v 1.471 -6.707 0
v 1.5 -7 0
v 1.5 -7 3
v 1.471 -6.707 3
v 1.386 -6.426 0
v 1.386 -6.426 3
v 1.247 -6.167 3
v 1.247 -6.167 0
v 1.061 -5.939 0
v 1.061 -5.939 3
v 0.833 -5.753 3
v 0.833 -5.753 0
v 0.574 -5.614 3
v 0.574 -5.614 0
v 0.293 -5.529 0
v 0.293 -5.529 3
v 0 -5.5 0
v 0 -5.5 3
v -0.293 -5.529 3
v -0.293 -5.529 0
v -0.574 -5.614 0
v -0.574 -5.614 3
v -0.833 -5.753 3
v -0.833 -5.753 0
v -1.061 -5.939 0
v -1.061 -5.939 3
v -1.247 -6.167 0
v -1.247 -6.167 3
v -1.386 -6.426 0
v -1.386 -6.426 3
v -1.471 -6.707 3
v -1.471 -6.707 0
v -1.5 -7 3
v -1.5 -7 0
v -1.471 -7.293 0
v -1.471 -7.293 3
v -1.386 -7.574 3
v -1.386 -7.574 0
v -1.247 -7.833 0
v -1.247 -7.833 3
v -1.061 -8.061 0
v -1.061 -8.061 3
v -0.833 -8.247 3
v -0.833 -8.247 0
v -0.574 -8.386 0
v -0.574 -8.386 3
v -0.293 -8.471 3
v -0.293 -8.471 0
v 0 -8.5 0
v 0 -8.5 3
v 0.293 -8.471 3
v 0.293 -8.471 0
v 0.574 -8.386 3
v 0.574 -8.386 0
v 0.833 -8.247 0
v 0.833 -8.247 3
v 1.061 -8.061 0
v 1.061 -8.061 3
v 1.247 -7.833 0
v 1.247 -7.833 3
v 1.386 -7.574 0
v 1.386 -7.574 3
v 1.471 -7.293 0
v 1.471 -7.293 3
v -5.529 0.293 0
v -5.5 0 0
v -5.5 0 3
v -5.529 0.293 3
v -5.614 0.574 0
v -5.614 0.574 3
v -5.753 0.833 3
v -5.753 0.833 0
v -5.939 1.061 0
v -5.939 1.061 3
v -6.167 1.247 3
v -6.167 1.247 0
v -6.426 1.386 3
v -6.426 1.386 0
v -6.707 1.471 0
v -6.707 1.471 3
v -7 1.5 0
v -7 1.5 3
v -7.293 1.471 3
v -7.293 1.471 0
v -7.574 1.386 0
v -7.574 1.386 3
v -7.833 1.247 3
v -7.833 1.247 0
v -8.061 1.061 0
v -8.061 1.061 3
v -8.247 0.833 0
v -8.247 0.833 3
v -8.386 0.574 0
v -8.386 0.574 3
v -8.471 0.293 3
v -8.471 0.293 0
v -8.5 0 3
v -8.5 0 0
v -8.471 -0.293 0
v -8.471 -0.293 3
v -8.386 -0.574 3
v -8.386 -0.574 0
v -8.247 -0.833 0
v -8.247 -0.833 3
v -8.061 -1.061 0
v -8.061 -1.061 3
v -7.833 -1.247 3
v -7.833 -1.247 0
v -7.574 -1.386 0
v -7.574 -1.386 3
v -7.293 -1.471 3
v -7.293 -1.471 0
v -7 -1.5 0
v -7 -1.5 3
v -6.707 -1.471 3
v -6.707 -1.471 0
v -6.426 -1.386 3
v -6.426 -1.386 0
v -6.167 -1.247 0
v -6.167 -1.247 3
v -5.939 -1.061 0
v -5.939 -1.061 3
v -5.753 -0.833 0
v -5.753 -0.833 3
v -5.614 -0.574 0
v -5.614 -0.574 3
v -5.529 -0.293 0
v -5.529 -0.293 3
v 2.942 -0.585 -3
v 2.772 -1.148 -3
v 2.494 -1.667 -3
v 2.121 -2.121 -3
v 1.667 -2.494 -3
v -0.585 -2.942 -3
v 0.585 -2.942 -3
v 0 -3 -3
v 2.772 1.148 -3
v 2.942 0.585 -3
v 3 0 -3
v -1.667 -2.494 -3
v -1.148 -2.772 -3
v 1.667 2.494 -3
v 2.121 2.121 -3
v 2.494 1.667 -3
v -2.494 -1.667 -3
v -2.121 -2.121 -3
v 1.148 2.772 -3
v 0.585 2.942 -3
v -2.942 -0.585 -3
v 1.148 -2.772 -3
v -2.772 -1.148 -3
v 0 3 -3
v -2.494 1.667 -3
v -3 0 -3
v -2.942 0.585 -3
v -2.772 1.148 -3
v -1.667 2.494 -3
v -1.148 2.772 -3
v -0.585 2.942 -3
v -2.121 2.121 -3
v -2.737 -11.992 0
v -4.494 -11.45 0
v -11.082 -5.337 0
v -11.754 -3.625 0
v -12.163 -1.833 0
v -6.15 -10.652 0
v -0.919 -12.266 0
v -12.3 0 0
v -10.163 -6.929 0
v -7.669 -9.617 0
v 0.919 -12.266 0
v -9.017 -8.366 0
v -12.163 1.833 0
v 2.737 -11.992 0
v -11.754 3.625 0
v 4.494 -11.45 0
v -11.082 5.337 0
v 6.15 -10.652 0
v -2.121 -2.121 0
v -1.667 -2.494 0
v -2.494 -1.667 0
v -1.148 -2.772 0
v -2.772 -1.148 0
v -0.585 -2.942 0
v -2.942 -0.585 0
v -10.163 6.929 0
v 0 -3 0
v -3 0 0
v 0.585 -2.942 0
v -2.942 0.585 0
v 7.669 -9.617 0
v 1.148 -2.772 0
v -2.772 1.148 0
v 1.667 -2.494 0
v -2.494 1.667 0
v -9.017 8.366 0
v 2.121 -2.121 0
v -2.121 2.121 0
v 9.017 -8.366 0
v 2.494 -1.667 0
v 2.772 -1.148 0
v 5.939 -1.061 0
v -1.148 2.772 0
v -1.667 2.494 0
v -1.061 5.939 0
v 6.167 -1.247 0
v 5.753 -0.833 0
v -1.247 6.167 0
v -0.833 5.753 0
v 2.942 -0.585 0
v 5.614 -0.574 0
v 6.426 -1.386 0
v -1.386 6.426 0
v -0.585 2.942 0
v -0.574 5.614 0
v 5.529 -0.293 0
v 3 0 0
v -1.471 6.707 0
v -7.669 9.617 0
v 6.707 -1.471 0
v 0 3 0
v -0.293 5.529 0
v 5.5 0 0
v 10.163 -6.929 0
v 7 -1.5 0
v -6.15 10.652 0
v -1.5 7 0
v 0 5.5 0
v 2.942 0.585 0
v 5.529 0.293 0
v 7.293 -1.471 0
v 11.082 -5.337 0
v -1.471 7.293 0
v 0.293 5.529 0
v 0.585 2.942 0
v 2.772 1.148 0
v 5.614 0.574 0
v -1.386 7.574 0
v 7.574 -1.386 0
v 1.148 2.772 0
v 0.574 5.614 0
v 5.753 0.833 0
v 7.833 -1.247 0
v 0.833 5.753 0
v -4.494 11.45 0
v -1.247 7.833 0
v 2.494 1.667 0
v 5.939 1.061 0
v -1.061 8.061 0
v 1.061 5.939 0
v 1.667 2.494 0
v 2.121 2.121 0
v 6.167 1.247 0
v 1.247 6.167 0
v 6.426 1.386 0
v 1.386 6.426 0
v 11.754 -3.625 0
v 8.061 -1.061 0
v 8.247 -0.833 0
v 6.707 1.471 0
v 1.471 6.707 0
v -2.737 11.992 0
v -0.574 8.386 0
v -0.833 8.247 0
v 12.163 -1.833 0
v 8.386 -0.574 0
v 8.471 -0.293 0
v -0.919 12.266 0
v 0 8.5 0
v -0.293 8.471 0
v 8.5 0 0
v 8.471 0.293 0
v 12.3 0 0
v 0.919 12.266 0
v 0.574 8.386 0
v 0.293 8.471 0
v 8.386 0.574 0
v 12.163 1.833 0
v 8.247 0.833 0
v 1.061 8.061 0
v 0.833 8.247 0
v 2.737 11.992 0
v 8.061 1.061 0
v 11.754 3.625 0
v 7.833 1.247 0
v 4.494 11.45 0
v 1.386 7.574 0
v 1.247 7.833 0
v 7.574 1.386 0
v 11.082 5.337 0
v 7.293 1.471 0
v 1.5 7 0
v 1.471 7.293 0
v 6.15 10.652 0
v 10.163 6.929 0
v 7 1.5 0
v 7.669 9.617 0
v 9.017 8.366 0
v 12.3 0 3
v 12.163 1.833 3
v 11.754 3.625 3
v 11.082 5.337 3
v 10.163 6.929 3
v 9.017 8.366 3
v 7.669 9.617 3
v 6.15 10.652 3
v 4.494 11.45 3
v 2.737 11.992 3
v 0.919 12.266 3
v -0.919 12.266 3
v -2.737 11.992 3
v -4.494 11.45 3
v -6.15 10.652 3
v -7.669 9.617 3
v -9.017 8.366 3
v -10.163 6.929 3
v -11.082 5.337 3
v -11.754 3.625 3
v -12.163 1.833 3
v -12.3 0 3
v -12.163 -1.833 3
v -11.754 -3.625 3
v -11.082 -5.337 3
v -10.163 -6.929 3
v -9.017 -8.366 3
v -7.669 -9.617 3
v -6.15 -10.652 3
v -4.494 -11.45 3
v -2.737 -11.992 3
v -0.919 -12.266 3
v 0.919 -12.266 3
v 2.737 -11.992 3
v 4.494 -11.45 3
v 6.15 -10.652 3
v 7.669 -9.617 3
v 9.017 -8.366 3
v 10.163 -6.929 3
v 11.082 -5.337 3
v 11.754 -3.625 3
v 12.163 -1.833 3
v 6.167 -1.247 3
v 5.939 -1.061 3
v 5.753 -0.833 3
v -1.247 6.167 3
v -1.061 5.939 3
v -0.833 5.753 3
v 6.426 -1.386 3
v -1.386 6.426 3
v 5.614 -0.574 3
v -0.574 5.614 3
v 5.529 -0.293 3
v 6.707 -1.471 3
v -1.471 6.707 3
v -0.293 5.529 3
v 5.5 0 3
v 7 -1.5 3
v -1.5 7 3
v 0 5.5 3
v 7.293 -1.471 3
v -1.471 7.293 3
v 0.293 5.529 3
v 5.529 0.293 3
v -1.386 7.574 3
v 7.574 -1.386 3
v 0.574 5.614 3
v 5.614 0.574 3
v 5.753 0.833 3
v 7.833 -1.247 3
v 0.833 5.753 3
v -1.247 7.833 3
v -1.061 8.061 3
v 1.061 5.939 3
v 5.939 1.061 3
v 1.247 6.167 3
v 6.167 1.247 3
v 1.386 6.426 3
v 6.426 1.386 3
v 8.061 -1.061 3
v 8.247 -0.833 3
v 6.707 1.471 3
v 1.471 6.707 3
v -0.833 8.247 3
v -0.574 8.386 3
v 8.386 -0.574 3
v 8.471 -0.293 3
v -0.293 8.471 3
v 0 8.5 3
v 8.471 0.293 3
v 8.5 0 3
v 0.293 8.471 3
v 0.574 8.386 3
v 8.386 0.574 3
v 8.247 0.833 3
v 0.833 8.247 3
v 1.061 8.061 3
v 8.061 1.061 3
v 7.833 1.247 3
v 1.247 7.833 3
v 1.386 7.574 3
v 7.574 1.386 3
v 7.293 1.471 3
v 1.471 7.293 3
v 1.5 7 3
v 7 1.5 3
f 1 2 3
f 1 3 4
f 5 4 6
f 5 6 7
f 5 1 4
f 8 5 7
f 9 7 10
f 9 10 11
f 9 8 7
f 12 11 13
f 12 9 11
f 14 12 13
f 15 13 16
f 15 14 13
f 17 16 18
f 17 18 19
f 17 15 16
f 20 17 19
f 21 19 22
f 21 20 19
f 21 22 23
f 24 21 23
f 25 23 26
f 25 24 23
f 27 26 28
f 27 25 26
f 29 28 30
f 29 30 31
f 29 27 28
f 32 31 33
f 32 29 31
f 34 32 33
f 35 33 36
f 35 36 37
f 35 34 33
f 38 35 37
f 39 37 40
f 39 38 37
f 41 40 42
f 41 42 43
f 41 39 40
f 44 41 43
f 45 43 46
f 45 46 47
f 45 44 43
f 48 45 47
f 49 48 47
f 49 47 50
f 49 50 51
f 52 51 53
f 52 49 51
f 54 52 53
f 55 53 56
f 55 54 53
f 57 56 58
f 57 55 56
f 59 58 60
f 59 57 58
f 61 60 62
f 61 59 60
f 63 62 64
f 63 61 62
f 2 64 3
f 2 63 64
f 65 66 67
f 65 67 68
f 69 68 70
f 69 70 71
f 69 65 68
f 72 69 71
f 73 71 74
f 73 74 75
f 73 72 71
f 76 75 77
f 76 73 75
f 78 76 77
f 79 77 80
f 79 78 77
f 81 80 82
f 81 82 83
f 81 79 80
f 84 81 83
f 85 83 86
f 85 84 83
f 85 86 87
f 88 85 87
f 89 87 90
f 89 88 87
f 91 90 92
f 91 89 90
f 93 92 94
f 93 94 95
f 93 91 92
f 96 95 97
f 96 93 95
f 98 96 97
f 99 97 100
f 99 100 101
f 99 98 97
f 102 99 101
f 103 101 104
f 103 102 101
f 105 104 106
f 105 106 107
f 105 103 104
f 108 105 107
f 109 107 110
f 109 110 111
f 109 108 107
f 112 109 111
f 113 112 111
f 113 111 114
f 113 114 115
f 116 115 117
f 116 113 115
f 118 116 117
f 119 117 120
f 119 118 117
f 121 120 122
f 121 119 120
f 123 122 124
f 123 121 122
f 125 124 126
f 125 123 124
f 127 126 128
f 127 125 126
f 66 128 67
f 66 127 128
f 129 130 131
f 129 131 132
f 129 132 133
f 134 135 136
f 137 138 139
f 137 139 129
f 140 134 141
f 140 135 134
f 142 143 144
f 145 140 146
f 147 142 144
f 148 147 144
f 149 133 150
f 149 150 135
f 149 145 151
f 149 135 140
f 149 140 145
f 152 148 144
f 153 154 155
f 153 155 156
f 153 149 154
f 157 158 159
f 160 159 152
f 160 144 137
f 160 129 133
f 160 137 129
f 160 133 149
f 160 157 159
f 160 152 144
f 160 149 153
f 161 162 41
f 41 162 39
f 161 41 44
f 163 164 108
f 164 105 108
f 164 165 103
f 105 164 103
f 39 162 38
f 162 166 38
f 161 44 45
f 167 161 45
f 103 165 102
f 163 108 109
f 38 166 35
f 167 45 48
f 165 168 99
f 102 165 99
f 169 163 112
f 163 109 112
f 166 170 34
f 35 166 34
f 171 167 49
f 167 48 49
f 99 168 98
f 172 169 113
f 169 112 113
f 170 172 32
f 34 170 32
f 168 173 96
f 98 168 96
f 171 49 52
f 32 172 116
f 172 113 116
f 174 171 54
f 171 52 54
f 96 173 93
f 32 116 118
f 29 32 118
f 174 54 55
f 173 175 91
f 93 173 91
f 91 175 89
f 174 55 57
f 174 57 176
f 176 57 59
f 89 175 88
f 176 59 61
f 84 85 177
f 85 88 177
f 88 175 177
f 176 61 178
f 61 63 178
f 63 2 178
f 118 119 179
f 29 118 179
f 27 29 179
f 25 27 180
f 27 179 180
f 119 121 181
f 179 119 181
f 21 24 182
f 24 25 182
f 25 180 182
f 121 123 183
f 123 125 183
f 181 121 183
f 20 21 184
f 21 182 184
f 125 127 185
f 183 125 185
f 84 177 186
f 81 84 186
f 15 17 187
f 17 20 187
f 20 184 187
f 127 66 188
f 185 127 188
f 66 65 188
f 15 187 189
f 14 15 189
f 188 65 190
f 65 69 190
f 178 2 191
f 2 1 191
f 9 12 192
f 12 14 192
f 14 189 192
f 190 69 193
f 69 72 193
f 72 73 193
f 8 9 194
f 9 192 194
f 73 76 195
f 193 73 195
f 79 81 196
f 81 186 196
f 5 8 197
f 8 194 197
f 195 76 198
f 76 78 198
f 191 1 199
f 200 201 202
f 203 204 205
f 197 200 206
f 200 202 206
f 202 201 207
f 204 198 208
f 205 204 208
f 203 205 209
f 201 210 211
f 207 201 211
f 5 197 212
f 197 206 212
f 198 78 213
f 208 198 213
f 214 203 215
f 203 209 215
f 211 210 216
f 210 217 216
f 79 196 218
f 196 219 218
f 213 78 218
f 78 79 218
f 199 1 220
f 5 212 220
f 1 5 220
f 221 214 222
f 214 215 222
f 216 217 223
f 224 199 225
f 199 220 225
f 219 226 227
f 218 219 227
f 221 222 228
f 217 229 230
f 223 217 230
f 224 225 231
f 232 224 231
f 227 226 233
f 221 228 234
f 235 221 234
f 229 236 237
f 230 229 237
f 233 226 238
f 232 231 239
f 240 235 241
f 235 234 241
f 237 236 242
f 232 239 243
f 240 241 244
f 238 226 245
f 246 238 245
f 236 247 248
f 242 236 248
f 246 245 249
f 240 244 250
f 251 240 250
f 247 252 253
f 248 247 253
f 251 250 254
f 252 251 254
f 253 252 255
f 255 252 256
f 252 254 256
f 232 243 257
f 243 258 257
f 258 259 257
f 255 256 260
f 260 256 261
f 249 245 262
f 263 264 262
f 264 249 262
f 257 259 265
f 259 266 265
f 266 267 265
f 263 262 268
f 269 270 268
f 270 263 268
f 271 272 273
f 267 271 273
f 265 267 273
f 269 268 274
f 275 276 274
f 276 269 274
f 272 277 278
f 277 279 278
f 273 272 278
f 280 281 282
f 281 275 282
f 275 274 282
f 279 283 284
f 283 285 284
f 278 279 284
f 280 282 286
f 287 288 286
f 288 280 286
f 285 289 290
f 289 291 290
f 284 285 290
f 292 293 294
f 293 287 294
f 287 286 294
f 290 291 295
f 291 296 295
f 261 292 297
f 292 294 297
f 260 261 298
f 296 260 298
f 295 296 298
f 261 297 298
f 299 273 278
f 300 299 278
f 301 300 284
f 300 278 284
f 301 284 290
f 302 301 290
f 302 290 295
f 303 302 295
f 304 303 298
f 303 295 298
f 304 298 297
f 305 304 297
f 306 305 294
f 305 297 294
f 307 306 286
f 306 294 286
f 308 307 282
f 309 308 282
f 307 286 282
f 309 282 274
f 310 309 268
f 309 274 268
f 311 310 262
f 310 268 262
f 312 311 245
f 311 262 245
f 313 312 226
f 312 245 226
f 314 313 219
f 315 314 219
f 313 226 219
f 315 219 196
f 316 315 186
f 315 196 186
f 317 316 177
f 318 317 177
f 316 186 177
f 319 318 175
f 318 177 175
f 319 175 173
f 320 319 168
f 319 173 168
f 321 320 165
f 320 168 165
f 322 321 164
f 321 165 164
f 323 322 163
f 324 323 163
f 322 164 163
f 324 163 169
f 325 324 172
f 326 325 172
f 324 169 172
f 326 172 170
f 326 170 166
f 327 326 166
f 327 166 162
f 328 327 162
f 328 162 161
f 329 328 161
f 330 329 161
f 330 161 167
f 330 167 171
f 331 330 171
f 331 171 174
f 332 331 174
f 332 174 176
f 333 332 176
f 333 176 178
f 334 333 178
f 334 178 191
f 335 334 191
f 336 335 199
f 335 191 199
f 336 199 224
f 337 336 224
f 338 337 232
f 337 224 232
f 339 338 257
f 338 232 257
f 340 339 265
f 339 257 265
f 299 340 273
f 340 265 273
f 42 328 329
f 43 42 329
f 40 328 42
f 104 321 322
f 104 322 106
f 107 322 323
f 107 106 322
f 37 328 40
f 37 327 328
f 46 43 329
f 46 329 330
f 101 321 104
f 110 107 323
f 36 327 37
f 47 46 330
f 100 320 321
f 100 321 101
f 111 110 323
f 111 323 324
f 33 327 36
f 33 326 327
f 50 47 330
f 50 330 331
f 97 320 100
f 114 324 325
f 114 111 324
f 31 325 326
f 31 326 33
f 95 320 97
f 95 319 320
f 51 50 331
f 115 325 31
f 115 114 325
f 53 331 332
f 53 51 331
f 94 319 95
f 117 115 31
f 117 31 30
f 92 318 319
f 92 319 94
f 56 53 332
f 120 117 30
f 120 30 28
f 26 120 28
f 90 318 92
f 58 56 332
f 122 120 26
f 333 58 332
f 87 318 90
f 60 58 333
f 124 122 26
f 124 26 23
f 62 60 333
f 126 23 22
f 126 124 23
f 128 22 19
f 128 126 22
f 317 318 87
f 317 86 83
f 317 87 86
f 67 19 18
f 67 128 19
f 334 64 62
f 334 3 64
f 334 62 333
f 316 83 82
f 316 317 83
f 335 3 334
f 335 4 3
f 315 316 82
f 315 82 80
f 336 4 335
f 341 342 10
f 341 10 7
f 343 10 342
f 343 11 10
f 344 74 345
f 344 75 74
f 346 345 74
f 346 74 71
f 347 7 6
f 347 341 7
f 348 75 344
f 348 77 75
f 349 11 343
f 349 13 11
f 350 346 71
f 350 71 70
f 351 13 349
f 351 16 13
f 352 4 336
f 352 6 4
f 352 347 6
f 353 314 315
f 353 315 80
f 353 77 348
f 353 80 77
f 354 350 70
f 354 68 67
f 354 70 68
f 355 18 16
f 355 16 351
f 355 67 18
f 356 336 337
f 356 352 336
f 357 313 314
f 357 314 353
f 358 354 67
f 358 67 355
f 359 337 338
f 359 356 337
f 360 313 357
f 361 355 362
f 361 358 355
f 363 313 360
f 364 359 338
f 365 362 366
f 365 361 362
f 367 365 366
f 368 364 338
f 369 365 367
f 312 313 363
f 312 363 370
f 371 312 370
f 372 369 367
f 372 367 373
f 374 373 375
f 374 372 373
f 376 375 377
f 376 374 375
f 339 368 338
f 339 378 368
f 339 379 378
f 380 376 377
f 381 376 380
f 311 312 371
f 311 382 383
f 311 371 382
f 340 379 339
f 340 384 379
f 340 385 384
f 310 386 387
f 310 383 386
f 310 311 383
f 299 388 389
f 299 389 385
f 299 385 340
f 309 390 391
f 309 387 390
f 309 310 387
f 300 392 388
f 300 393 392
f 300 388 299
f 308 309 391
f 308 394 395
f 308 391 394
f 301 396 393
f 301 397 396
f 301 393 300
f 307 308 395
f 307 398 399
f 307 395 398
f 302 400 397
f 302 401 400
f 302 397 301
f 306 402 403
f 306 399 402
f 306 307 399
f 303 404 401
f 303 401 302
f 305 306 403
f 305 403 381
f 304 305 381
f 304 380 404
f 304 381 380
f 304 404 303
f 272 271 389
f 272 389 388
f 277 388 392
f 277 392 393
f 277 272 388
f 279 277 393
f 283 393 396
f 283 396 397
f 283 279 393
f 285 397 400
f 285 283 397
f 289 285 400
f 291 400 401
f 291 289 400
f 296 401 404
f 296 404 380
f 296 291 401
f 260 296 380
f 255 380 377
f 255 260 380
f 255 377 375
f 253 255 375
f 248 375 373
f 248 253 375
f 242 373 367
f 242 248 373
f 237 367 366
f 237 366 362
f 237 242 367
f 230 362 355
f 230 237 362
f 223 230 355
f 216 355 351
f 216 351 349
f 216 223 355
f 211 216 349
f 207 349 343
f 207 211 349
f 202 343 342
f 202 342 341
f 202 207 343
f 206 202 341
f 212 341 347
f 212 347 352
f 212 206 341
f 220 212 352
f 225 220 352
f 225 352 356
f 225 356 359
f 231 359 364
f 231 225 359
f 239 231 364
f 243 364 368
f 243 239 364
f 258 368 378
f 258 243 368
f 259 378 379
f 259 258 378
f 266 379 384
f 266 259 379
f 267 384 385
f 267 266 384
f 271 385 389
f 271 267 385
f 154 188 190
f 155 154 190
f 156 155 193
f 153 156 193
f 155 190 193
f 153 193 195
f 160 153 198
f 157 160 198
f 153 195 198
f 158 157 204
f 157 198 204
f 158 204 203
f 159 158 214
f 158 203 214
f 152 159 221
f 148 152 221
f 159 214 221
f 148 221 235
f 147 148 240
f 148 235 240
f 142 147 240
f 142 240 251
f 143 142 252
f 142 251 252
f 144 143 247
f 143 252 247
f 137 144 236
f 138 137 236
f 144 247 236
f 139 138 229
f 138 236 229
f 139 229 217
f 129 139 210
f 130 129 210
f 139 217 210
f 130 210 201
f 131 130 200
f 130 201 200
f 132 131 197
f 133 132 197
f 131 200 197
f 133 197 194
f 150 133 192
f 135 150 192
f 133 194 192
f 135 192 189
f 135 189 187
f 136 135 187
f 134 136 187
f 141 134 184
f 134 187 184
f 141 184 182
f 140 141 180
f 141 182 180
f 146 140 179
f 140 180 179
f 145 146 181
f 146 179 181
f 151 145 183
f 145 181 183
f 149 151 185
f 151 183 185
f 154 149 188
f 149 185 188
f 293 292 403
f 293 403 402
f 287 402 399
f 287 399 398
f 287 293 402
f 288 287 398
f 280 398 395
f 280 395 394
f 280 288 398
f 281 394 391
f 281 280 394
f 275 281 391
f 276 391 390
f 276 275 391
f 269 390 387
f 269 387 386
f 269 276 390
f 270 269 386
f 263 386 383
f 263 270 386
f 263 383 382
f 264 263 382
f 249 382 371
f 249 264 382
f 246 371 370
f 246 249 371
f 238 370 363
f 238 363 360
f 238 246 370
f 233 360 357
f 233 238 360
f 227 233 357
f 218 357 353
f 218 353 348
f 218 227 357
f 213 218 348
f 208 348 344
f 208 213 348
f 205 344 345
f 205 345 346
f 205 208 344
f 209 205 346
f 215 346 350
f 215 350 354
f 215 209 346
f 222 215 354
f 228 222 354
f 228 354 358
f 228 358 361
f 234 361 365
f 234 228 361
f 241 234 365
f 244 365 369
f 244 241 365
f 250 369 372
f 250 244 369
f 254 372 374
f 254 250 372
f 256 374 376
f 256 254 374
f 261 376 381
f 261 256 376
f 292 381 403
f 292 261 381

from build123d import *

# Parameters (mm, degrees)
SKETCH2_R           = 12.3
SKETCH2_R_2         = 1.5
BOSS_EXTRUDE1_DEPTH = 3
SKETCH3_R           = 3
BOSS_EXTRUDE2_DEPTH = 3


with BuildPart() as part:
    # Sketch2 → Boss-Extrude1 (new body)
    with BuildSketch(Plane.XY):
        Circle(SKETCH2_R)
        with Locations((-7, 0)):
            Circle(SKETCH2_R_2, mode=Mode.SUBTRACT)
        with Locations((0, 7)):
            Circle(SKETCH2_R_2, mode=Mode.SUBTRACT)
        with Locations((7, 0)):
            Circle(SKETCH2_R_2, mode=Mode.SUBTRACT)
        with Locations((0, -7)):
            Circle(SKETCH2_R_2, mode=Mode.SUBTRACT)
    extrude(amount=BOSS_EXTRUDE1_DEPTH)

    # Sketch3 → Boss-Extrude2 (add)
    with BuildSketch(Plane(origin=(0, 0, 0), x_dir=(-1, 0, 0), z_dir=(0, 0, -1))):
        Circle(SKETCH3_R)
    extrude(amount=BOSS_EXTRUDE2_DEPTH)


solid = part.part
